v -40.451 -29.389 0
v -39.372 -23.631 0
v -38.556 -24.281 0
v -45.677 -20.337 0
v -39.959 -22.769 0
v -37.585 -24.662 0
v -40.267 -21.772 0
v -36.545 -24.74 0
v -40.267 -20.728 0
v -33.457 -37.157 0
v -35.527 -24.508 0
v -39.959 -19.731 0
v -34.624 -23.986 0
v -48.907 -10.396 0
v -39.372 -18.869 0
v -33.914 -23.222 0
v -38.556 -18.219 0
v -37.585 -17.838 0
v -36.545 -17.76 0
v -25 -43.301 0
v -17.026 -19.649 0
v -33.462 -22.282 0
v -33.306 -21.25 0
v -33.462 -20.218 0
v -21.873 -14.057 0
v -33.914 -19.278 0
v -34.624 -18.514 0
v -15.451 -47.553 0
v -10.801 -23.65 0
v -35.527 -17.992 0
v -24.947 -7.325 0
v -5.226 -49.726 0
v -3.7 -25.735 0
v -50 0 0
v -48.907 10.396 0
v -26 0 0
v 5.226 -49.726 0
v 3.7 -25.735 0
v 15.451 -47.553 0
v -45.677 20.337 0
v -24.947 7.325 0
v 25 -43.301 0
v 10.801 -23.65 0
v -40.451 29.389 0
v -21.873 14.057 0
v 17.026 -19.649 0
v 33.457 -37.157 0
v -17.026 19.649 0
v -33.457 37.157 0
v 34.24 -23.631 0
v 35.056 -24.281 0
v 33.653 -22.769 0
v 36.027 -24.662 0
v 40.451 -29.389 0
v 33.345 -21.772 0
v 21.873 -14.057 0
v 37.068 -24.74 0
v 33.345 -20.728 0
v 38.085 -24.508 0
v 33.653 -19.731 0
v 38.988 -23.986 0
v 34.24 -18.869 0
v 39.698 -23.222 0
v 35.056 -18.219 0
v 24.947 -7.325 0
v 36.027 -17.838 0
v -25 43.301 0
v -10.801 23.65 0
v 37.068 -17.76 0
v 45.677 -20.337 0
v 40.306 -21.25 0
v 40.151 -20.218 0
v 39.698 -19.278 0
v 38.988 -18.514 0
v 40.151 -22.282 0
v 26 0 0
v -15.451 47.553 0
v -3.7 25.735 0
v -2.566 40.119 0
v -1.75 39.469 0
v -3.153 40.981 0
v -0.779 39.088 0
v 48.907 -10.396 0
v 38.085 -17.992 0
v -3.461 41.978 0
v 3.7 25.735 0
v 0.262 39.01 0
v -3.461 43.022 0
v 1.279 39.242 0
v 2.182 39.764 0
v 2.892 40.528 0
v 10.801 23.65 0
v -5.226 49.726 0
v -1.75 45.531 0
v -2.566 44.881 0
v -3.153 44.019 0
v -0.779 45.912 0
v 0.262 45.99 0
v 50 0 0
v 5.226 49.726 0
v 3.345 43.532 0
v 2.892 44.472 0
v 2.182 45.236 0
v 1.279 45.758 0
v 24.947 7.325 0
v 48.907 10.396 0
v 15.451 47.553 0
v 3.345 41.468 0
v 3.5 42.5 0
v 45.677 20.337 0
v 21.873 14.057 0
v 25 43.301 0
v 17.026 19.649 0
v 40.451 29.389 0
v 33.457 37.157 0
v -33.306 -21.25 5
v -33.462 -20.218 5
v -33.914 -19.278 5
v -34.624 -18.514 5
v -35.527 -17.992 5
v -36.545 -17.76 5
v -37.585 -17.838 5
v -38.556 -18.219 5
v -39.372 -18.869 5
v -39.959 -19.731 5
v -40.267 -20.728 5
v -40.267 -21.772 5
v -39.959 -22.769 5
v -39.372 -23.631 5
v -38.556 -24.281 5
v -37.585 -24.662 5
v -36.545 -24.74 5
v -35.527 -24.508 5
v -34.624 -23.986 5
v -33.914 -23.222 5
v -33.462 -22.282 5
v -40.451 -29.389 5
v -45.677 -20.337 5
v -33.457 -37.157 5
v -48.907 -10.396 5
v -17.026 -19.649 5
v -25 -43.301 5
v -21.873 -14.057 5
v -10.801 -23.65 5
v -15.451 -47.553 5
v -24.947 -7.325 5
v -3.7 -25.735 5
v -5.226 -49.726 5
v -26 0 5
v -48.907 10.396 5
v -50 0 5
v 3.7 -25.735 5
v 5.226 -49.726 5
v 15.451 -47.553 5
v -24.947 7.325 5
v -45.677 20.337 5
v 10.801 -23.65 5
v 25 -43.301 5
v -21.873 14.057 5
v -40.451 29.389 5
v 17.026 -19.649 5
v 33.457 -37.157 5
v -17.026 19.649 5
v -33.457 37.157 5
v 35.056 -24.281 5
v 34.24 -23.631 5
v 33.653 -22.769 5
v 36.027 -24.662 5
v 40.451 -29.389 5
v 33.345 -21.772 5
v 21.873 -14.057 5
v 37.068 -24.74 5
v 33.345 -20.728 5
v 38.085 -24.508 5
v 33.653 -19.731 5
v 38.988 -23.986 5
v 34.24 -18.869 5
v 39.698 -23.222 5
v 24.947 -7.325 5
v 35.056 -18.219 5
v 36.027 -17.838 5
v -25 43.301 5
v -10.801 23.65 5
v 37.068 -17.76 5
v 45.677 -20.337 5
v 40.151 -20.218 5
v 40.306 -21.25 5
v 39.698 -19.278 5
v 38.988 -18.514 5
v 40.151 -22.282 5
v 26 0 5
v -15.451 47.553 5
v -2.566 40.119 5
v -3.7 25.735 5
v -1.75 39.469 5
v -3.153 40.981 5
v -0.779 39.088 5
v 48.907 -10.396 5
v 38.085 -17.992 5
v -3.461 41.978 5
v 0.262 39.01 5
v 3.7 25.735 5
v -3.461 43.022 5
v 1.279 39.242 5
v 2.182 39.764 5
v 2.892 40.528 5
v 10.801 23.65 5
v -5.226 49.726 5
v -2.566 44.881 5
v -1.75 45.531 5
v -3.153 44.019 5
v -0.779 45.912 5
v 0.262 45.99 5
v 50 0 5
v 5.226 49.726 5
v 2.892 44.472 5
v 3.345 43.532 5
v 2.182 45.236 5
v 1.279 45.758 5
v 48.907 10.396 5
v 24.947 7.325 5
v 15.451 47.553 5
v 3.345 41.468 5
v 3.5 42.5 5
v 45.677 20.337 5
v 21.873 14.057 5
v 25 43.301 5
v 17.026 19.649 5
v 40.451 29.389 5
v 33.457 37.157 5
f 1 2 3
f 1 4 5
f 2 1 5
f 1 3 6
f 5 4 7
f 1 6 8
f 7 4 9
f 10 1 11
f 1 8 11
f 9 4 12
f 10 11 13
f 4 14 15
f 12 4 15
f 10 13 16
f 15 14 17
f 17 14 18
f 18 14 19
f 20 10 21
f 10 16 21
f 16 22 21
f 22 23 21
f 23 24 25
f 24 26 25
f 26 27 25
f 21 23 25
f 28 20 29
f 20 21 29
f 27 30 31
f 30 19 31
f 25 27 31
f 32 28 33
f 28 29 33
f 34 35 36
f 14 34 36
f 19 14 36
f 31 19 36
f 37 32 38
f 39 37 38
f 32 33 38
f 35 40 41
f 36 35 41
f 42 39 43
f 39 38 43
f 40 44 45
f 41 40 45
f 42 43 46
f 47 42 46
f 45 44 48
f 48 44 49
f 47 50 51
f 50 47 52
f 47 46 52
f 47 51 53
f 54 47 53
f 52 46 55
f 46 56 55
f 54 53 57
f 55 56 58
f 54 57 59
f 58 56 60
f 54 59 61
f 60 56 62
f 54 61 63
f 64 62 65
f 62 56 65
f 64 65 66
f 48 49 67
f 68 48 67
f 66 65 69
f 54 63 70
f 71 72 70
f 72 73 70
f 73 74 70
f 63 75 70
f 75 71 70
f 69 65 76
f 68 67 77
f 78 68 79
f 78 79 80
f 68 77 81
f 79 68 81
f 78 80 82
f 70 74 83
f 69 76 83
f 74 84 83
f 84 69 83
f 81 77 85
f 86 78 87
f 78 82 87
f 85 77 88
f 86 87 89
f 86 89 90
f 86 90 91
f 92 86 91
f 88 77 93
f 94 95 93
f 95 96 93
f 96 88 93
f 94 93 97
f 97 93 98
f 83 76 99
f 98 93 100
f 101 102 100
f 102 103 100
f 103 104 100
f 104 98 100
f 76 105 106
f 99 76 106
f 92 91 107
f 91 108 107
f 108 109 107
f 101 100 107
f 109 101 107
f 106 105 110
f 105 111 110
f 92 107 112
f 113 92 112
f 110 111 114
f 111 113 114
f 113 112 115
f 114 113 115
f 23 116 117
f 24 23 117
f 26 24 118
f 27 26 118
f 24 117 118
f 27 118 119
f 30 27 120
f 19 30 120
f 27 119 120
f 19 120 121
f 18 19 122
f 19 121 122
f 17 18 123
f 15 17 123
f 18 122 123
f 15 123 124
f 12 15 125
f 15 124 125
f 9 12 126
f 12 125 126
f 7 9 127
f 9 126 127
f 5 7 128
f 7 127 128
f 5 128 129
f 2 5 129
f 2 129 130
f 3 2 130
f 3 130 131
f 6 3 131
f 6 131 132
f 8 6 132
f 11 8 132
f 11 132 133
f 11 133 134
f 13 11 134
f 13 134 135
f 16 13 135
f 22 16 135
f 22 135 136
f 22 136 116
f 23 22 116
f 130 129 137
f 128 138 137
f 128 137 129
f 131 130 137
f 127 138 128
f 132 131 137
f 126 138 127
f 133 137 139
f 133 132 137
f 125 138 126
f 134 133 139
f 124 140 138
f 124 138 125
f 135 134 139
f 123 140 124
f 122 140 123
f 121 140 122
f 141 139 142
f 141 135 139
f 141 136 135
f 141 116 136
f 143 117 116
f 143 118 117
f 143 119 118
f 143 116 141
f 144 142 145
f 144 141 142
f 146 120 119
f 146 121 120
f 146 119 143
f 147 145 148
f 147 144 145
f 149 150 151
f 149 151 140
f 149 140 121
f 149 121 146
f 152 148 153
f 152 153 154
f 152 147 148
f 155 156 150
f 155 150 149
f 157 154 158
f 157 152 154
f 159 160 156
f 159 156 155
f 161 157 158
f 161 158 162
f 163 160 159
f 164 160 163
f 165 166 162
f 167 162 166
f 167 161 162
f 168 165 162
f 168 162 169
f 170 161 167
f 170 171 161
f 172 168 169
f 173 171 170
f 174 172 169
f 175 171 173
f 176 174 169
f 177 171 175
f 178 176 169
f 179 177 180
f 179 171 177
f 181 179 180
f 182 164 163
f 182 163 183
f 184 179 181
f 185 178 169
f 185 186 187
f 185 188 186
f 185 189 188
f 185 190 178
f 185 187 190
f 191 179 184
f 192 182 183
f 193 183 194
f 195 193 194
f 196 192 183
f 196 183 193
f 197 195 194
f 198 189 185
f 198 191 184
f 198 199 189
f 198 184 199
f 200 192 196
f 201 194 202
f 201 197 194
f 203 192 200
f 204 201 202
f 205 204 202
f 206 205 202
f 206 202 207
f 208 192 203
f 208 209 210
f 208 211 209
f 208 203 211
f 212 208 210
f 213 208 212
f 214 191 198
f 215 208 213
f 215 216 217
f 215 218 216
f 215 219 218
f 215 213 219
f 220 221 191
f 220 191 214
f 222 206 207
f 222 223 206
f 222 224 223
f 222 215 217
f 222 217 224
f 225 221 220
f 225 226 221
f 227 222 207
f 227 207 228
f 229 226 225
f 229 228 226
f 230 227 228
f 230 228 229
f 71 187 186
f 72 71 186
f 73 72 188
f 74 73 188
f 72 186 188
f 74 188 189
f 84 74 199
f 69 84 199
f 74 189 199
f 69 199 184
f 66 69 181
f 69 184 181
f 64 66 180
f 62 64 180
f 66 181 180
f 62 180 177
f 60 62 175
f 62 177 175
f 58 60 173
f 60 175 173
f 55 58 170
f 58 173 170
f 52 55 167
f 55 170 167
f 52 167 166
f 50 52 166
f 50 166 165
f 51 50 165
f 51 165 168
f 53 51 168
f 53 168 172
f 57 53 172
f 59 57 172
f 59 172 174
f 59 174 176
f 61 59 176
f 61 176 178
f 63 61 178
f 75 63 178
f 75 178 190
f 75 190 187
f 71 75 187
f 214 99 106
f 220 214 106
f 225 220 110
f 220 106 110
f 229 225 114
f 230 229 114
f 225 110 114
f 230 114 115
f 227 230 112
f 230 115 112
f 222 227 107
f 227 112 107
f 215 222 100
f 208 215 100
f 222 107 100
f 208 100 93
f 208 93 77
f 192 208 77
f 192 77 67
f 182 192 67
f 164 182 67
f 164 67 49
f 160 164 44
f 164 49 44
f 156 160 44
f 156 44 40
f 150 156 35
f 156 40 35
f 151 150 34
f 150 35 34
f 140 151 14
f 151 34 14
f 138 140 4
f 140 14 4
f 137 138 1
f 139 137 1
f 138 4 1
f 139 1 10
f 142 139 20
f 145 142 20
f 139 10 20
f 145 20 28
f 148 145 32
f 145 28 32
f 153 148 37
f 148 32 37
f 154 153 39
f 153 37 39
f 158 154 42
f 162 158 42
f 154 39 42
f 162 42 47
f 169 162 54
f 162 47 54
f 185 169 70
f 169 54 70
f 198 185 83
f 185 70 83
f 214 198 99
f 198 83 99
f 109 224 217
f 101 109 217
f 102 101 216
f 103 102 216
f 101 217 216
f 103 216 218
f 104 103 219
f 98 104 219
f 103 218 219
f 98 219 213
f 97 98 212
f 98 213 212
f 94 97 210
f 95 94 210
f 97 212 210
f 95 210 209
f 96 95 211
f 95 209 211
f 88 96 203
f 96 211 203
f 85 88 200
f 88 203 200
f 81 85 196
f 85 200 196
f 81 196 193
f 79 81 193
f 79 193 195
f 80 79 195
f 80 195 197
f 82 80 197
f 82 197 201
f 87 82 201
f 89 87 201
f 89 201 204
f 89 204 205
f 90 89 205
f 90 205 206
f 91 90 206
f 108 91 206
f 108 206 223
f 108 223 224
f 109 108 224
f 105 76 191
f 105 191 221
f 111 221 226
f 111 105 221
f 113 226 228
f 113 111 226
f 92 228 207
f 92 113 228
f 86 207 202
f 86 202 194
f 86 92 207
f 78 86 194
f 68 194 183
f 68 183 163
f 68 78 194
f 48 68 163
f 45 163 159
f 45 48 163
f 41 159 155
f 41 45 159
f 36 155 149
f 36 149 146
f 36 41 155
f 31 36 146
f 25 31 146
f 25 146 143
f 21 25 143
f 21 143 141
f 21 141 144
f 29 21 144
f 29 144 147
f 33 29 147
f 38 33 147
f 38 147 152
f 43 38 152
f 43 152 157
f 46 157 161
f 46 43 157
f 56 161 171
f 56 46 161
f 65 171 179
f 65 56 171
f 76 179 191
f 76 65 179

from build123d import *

# Parameters (mm, degrees)
SZKIC1_R                        = 50
SZKIC1_R_2                      = 26
DODANIE_WYCI_GNI_CIE1_DEPTH     = 5
SZKIC3_R                        = 3.5
WYTNIJ_WYCI_GNI_CIE4_DEPTH      = 1
WYTNIJ_WYCI_GNI_CIE4_DEPTH_BACK = 6


with BuildPart() as part:
    # Szkic1 → Dodanie-wyciągnięcie1 (new body)
    with BuildSketch(Plane.XY):
        Circle(SZKIC1_R)
        Circle(SZKIC1_R_2, mode=Mode.SUBTRACT)
    extrude(amount=DODANIE_WYCI_GNI_CIE1_DEPTH)

    # Szkic3 → Wytnij-wyciągnięcie4 (cut, two sides)
    with BuildSketch(Plane.XY.offset(5)) as wytnij_wyci_gni_cie4_sk:
        with Locations((0, 42.5)):
            Circle(SZKIC3_R)
        with Locations((36.806079661, -21.25)):
            Circle(SZKIC3_R)
        with Locations((-36.806079661, -21.25)):
            Circle(SZKIC3_R)
    extrude(amount=WYTNIJ_WYCI_GNI_CIE4_DEPTH, mode=Mode.SUBTRACT)
    extrude(wytnij_wyci_gni_cie4_sk.sketch, amount=-WYTNIJ_WYCI_GNI_CIE4_DEPTH_BACK, mode=Mode.SUBTRACT)


solid = part.part
